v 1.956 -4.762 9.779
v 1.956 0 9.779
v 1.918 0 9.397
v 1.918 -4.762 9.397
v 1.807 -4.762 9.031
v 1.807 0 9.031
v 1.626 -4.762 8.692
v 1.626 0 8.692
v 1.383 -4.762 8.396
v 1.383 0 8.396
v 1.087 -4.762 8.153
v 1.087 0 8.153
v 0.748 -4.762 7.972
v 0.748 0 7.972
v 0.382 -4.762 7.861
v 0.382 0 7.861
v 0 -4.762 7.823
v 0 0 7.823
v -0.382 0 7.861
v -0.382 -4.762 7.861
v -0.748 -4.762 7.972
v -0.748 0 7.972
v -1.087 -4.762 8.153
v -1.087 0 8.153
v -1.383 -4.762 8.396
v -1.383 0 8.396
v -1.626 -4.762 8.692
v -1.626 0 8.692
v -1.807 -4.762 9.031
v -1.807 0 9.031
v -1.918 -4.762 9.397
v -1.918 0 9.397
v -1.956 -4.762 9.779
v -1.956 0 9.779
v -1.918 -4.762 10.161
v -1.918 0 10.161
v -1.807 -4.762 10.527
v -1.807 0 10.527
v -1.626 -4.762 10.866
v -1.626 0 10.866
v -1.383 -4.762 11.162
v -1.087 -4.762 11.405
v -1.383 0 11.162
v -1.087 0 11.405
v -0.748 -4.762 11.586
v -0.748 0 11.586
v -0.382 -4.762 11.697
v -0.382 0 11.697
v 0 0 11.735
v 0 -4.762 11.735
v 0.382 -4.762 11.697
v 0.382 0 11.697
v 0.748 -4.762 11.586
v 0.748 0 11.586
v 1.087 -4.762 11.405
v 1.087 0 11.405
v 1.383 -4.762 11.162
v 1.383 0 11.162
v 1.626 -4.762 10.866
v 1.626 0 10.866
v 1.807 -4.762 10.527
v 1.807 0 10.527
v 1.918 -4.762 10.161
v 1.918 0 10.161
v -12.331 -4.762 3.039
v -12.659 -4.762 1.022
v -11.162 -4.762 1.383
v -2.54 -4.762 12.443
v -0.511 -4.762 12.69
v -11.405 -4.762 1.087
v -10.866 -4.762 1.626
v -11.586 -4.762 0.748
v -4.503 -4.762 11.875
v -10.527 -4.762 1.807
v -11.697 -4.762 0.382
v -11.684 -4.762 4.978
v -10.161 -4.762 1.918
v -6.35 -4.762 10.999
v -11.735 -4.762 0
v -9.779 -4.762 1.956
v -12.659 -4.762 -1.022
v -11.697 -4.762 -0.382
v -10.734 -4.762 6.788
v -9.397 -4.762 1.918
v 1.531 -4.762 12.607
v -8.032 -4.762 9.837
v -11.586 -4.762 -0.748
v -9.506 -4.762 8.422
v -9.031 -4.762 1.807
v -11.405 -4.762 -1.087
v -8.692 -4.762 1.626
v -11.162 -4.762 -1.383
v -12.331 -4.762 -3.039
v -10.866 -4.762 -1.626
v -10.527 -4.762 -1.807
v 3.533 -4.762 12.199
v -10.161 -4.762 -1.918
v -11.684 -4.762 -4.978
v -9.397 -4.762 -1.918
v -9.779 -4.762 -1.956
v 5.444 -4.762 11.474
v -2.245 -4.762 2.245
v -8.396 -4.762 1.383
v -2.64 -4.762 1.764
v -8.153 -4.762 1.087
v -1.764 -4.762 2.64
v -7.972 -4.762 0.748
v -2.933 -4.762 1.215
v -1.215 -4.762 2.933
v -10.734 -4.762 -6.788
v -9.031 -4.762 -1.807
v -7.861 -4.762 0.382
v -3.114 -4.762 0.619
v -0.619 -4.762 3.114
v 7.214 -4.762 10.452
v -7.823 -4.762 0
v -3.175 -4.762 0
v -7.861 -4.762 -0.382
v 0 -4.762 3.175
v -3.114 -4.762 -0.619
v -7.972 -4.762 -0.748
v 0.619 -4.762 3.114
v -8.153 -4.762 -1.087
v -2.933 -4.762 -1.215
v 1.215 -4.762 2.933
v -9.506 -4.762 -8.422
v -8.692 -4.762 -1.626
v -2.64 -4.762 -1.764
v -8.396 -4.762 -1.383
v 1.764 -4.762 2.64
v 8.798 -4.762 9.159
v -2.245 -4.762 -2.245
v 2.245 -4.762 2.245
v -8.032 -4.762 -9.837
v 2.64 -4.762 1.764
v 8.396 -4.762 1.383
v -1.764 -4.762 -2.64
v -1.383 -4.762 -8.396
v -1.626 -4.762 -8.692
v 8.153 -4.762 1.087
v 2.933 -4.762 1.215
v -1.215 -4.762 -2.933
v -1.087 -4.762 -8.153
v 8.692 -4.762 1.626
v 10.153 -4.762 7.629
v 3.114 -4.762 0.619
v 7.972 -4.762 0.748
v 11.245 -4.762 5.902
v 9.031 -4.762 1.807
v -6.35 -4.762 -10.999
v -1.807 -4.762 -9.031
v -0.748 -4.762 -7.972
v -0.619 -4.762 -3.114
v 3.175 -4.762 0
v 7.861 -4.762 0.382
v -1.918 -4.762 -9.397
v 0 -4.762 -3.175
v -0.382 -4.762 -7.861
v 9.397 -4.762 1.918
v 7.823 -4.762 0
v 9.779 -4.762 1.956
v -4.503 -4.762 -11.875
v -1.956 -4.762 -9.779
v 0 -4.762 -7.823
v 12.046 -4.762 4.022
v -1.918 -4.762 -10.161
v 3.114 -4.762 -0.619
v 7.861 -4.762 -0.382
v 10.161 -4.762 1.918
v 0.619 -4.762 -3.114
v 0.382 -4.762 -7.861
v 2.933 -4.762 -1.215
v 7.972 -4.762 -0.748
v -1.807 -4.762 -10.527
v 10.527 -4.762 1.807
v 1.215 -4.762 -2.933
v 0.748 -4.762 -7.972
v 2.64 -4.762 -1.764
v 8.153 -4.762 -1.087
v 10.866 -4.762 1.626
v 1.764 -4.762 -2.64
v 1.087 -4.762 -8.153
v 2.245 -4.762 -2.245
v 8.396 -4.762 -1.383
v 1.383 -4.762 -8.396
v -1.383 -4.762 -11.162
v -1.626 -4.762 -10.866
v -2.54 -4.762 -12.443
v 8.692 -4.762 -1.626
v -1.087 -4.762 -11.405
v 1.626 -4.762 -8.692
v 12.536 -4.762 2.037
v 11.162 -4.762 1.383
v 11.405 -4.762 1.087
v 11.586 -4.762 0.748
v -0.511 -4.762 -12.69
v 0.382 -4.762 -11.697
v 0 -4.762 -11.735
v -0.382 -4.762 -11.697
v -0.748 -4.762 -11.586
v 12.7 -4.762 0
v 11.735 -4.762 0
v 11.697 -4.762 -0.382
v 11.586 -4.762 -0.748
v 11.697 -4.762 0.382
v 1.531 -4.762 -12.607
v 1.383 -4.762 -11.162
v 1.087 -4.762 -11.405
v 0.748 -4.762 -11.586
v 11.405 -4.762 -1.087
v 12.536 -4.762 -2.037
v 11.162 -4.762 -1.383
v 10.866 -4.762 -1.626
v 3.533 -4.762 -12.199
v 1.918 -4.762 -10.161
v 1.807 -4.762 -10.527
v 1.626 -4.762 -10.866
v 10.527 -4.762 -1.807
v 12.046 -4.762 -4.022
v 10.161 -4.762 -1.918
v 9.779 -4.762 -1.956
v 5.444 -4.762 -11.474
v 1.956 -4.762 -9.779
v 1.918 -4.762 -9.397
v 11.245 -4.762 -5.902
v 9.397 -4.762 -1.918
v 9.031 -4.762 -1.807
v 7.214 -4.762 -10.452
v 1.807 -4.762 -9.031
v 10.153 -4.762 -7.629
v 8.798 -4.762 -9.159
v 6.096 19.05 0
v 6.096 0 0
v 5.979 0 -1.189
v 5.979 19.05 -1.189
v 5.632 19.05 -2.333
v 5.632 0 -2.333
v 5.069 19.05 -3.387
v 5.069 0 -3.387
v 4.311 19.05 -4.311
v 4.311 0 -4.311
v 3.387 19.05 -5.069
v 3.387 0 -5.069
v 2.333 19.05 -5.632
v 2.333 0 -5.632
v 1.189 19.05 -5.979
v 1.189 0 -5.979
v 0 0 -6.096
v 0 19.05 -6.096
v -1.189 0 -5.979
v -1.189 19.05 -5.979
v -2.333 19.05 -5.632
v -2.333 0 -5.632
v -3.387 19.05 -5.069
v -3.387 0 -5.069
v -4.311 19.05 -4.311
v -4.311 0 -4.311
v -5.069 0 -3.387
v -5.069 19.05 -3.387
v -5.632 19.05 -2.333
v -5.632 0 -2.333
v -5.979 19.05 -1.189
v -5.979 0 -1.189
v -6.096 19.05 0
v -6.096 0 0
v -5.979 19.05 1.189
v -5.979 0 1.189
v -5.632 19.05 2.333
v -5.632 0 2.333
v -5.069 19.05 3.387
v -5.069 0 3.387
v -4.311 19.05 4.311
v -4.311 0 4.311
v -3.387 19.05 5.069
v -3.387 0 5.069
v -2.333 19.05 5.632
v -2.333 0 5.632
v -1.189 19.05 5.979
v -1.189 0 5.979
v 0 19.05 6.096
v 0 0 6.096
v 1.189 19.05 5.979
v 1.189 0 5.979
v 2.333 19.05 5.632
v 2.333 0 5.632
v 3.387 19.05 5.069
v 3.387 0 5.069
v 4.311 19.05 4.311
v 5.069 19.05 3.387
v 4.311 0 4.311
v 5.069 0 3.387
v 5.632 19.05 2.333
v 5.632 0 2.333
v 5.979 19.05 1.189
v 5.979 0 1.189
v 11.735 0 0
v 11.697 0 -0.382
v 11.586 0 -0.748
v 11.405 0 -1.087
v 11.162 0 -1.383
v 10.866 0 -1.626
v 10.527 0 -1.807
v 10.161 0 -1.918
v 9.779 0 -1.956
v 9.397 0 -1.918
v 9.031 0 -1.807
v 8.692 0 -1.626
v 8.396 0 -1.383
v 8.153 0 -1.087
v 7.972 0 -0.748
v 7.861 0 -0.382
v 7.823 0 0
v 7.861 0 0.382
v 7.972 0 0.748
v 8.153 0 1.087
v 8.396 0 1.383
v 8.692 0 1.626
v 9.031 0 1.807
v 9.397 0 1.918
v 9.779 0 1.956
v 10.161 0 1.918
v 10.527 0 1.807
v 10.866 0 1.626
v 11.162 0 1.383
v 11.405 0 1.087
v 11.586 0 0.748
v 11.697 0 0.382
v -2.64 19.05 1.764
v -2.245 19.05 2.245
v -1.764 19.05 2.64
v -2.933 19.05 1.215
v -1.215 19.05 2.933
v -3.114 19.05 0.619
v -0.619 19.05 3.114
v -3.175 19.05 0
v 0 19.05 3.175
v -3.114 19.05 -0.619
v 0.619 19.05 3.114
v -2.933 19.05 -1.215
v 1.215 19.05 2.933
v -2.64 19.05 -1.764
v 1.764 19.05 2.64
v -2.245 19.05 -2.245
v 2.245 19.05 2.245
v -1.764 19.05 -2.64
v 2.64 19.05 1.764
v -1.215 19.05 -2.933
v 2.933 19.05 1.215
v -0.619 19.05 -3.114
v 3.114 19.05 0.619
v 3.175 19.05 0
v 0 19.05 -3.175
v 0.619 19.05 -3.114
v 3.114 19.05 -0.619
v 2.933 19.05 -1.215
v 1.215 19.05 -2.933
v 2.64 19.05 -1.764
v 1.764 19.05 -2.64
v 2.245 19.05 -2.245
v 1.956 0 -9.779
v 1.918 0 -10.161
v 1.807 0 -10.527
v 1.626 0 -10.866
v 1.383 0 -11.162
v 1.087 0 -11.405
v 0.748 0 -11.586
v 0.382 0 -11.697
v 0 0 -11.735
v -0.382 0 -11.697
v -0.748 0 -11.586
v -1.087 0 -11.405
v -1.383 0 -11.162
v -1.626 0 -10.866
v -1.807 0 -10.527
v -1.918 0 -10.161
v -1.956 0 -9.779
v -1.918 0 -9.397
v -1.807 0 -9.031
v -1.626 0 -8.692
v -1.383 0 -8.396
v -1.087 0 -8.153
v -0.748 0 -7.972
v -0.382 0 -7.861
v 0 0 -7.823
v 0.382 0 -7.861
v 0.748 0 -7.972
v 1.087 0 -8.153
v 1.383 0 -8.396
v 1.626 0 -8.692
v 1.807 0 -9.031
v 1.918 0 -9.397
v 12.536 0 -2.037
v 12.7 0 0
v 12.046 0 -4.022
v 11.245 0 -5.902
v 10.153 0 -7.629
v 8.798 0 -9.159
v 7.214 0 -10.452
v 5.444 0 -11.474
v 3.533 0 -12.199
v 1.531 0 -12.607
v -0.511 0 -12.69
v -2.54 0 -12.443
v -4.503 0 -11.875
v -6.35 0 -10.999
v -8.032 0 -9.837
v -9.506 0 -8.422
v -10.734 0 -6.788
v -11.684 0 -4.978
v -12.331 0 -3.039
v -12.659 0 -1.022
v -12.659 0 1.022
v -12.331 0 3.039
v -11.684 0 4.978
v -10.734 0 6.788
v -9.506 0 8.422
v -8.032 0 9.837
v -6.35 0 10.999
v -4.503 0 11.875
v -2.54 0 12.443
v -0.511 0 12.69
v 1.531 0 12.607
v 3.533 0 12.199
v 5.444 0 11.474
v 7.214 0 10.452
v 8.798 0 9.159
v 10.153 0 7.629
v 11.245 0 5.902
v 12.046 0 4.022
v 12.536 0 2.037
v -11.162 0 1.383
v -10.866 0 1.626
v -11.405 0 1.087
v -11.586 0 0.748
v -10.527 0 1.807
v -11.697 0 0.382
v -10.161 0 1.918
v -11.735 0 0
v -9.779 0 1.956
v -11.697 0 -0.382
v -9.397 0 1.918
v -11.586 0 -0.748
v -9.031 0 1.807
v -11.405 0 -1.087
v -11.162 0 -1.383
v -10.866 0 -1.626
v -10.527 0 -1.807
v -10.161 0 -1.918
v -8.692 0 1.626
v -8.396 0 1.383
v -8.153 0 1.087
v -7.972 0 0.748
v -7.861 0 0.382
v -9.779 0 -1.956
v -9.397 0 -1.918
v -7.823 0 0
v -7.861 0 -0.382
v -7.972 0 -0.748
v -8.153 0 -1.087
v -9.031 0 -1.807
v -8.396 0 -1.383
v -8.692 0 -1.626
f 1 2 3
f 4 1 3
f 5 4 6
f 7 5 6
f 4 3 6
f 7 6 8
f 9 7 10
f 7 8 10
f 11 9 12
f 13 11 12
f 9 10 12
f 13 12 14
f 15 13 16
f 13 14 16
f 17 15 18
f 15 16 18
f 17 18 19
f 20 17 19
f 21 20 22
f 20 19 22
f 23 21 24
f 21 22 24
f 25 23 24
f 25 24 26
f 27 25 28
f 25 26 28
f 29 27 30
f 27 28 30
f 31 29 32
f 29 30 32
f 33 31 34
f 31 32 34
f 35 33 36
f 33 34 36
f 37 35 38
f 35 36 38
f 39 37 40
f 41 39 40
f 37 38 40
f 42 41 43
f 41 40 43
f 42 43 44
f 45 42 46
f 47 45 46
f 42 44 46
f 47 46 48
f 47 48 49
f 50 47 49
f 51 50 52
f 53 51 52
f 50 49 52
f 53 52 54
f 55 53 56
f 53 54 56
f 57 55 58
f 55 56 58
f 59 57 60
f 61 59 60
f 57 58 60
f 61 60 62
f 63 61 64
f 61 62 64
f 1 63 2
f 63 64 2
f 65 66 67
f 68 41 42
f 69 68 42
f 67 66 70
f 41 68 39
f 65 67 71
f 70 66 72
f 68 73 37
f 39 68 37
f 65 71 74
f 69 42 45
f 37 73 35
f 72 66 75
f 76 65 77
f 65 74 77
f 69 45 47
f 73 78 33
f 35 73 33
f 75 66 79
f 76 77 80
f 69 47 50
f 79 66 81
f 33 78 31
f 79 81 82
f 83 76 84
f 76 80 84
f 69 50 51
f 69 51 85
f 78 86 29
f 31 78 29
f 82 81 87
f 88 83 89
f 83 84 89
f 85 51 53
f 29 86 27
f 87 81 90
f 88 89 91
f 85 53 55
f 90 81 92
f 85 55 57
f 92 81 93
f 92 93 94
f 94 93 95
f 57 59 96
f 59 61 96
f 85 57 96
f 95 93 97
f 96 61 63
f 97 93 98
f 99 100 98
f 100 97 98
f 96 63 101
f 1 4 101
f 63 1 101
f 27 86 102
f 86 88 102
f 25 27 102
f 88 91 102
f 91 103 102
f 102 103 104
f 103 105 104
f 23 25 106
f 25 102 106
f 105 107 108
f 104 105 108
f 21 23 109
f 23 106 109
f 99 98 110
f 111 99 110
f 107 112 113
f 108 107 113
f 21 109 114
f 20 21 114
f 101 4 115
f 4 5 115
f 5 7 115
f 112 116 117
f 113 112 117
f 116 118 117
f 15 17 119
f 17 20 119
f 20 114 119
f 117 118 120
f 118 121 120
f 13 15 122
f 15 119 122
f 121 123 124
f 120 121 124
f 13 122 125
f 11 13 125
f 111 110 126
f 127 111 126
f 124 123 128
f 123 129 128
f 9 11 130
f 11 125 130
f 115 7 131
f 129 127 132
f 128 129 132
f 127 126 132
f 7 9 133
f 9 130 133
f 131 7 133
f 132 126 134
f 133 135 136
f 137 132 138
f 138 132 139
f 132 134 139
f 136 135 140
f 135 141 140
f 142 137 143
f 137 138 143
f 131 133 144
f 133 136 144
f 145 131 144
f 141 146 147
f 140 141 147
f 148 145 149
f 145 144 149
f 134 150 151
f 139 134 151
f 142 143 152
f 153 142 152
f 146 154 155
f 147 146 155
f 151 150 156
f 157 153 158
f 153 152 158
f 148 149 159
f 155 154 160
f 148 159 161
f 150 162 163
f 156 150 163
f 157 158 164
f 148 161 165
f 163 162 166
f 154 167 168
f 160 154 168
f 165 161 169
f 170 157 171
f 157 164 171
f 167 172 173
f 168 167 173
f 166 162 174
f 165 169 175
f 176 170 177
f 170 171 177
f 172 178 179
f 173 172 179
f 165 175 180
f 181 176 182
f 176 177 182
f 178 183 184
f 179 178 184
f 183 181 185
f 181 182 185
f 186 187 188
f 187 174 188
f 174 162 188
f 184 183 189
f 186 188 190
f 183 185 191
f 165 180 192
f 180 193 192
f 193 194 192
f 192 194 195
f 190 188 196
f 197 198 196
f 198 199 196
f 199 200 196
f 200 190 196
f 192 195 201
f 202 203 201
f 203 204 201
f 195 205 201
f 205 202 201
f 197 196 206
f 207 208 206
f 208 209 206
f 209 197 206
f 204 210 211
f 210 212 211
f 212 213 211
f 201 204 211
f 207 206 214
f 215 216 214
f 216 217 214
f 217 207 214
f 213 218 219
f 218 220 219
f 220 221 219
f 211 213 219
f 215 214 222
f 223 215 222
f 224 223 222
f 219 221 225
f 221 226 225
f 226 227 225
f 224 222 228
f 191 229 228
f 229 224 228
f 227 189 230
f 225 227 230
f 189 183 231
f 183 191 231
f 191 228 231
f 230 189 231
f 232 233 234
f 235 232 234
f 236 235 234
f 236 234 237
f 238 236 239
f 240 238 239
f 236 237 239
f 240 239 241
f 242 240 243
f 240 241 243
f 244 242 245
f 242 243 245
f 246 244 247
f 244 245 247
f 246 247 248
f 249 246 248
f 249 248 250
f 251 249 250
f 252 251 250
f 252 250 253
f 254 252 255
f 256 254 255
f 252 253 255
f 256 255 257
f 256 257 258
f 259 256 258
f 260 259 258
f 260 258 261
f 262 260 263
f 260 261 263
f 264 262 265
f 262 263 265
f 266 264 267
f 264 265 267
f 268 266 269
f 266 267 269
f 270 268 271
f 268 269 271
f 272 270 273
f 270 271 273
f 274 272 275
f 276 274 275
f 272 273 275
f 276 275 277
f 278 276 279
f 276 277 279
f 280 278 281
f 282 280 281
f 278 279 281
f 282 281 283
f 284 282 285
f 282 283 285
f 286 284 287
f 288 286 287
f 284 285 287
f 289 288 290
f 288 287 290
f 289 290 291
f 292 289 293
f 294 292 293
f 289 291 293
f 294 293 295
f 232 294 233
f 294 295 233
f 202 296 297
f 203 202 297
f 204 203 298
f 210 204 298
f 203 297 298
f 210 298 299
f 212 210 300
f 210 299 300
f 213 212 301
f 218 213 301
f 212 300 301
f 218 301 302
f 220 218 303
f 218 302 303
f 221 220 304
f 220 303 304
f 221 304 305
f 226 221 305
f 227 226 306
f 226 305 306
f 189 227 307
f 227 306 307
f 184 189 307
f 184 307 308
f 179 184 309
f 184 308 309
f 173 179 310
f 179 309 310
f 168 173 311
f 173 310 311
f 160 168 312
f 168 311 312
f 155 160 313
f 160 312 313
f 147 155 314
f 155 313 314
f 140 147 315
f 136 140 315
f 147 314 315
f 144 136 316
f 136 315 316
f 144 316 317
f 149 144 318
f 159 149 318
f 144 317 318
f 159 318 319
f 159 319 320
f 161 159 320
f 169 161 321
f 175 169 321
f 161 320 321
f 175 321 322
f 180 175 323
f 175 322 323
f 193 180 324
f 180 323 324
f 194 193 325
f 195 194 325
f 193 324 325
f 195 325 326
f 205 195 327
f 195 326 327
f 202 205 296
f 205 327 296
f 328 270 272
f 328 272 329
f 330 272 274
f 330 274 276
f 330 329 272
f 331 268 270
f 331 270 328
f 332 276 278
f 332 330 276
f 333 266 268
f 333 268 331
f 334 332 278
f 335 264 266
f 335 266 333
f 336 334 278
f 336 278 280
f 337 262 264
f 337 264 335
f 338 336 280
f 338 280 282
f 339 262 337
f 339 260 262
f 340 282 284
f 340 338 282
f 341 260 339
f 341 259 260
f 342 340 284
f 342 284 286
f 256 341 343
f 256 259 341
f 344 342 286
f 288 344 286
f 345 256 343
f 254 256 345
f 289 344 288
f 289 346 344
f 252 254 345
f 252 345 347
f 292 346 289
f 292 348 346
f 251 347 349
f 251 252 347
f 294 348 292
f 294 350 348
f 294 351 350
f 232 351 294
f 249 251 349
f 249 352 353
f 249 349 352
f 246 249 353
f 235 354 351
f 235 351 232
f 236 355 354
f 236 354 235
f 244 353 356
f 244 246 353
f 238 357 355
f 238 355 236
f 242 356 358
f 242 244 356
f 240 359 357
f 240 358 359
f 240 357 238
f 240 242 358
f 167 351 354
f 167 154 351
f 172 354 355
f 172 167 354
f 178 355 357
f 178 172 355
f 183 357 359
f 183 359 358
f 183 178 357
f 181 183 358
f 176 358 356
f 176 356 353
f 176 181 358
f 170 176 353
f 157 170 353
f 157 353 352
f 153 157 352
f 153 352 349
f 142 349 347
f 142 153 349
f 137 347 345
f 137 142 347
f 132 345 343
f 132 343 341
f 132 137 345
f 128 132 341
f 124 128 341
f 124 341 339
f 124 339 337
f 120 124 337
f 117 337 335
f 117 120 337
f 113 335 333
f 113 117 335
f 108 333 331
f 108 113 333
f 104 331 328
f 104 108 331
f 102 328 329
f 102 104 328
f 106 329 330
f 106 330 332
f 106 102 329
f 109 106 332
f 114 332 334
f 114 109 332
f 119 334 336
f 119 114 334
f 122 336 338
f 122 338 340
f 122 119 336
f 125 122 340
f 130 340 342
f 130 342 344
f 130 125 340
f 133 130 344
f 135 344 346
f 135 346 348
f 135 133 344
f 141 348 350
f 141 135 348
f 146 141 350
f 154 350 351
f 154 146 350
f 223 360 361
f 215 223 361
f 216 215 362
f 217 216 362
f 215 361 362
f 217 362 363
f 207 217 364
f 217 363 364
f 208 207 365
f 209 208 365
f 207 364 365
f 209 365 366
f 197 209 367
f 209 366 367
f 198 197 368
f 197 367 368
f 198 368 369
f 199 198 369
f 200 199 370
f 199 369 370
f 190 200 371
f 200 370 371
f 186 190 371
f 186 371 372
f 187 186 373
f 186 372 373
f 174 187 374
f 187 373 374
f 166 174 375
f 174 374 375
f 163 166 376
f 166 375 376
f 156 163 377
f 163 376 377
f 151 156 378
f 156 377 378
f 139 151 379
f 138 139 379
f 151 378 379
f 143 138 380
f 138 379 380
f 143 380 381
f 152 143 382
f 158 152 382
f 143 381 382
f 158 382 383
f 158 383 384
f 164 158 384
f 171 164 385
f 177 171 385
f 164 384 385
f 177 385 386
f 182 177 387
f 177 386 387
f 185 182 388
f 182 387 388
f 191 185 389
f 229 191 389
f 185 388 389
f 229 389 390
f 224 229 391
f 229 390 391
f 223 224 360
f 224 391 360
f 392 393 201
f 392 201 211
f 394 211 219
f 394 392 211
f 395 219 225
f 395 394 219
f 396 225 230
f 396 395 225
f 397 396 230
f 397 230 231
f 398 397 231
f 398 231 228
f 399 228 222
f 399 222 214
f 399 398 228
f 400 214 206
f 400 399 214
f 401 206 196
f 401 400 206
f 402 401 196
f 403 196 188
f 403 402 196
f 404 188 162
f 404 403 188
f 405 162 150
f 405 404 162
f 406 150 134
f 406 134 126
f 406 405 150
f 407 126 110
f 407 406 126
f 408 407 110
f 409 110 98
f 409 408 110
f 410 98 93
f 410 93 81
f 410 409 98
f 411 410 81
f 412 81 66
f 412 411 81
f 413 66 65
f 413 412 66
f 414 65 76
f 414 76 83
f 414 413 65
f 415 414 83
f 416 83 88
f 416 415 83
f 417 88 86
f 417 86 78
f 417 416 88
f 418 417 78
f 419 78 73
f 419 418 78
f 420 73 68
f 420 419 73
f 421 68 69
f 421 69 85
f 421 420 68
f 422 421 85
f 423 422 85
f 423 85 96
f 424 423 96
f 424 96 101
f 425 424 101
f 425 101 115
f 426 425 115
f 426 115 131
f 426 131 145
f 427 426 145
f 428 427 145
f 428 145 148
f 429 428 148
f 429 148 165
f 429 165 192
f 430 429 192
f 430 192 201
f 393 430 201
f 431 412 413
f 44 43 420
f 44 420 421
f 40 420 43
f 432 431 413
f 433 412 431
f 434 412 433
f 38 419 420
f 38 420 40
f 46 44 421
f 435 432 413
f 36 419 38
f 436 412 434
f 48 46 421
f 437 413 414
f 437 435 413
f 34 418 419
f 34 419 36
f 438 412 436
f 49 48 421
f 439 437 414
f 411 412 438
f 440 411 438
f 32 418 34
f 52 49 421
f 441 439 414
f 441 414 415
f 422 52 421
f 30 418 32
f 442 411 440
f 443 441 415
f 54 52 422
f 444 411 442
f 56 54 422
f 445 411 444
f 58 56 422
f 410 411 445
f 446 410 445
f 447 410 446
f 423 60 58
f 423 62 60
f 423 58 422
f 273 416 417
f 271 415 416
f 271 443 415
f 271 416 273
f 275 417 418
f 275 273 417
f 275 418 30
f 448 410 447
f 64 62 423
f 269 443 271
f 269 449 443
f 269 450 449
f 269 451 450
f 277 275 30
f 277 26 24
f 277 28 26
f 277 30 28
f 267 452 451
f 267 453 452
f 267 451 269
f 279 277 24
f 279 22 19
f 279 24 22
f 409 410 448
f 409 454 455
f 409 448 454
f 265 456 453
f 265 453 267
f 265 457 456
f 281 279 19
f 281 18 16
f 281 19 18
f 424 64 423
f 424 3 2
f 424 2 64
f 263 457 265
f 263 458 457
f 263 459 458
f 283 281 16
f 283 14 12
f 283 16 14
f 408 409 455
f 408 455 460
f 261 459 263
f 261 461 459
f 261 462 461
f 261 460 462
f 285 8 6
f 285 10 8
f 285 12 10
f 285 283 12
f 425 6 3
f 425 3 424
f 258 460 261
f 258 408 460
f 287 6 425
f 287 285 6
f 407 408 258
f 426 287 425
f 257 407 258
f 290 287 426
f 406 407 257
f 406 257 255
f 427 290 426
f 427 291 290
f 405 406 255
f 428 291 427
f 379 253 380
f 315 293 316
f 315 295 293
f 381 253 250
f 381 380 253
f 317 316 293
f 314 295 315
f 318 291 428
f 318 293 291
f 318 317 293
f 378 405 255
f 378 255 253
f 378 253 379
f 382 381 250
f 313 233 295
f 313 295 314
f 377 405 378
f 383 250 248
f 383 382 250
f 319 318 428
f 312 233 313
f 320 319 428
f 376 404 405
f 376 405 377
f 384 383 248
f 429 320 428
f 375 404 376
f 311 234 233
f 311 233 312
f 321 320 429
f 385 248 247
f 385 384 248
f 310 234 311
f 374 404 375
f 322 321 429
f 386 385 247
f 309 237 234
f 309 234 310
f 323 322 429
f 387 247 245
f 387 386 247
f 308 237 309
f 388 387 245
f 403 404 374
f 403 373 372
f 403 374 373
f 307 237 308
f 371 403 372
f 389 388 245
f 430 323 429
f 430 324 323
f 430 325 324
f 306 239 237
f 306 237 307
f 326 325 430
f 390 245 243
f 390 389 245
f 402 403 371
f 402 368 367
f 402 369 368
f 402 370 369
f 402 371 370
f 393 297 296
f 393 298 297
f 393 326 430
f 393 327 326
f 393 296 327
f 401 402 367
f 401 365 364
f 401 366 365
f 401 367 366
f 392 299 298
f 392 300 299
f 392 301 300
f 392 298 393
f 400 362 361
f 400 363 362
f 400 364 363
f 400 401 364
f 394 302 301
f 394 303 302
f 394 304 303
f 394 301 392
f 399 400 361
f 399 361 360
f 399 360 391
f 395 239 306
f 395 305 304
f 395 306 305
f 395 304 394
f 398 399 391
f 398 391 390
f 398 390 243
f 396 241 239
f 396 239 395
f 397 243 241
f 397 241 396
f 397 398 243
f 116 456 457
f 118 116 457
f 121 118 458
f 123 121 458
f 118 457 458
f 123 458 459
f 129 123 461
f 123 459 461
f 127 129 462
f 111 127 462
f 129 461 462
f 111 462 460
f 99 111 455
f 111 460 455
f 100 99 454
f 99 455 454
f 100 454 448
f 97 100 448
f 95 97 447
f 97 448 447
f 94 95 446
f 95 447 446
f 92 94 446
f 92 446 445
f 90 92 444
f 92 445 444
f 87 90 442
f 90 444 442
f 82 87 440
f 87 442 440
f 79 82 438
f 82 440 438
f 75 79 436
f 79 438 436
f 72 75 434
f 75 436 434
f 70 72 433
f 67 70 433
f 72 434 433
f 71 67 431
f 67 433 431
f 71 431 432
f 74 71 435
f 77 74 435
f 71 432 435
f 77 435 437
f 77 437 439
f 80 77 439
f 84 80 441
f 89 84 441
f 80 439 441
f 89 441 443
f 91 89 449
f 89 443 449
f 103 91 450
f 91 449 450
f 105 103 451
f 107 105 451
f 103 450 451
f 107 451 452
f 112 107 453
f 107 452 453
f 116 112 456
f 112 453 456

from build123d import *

# Parameters (mm, degrees)
SKETCH1_R           = 12.7
SKETCH1_R_2         = 1.9558
SKETCH1_R_3         = 3.175
BOSS_EXTRUDE1_DEPTH = 4.7625
BOSS_EXTRUDE2_START = 19.05
SKETCH1_3_R         = 6.096
SKETCH1_3_R_2       = 3.175
BOSS_EXTRUDE2_DEPTH = 19.05


with BuildPart() as part:
    # Sketch1 → Boss-Extrude1 (new body)
    with BuildSketch(Plane(origin=(0, 0, 0), x_dir=(1, 0, 0), z_dir=(0, 1, 0))):
        Circle(SKETCH1_R)
        with Locations((-9.779, 0)):
            Circle(SKETCH1_R_2, mode=Mode.SUBTRACT)
        with Locations((0, -9.779)):
            Circle(SKETCH1_R_2, mode=Mode.SUBTRACT)
        with Locations((9.779, 0)):
            Circle(SKETCH1_R_2, mode=Mode.SUBTRACT)
        with Locations((0, 9.779)):
            Circle(SKETCH1_R_2, mode=Mode.SUBTRACT)
        Circle(SKETCH1_R_3, mode=Mode.SUBTRACT)
    extrude(amount=-BOSS_EXTRUDE1_DEPTH)

    # Sketch1<3> → Boss-Extrude2 (add)
    with BuildSketch(Plane(origin=(0, 0, 0), x_dir=(1, 0, 0), z_dir=(0, 1, 0)).offset(BOSS_EXTRUDE2_START)):
        Circle(SKETCH1_3_R)
        Circle(SKETCH1_3_R_2, mode=Mode.SUBTRACT)
    extrude(amount=-BOSS_EXTRUDE2_DEPTH)


solid = part.part
